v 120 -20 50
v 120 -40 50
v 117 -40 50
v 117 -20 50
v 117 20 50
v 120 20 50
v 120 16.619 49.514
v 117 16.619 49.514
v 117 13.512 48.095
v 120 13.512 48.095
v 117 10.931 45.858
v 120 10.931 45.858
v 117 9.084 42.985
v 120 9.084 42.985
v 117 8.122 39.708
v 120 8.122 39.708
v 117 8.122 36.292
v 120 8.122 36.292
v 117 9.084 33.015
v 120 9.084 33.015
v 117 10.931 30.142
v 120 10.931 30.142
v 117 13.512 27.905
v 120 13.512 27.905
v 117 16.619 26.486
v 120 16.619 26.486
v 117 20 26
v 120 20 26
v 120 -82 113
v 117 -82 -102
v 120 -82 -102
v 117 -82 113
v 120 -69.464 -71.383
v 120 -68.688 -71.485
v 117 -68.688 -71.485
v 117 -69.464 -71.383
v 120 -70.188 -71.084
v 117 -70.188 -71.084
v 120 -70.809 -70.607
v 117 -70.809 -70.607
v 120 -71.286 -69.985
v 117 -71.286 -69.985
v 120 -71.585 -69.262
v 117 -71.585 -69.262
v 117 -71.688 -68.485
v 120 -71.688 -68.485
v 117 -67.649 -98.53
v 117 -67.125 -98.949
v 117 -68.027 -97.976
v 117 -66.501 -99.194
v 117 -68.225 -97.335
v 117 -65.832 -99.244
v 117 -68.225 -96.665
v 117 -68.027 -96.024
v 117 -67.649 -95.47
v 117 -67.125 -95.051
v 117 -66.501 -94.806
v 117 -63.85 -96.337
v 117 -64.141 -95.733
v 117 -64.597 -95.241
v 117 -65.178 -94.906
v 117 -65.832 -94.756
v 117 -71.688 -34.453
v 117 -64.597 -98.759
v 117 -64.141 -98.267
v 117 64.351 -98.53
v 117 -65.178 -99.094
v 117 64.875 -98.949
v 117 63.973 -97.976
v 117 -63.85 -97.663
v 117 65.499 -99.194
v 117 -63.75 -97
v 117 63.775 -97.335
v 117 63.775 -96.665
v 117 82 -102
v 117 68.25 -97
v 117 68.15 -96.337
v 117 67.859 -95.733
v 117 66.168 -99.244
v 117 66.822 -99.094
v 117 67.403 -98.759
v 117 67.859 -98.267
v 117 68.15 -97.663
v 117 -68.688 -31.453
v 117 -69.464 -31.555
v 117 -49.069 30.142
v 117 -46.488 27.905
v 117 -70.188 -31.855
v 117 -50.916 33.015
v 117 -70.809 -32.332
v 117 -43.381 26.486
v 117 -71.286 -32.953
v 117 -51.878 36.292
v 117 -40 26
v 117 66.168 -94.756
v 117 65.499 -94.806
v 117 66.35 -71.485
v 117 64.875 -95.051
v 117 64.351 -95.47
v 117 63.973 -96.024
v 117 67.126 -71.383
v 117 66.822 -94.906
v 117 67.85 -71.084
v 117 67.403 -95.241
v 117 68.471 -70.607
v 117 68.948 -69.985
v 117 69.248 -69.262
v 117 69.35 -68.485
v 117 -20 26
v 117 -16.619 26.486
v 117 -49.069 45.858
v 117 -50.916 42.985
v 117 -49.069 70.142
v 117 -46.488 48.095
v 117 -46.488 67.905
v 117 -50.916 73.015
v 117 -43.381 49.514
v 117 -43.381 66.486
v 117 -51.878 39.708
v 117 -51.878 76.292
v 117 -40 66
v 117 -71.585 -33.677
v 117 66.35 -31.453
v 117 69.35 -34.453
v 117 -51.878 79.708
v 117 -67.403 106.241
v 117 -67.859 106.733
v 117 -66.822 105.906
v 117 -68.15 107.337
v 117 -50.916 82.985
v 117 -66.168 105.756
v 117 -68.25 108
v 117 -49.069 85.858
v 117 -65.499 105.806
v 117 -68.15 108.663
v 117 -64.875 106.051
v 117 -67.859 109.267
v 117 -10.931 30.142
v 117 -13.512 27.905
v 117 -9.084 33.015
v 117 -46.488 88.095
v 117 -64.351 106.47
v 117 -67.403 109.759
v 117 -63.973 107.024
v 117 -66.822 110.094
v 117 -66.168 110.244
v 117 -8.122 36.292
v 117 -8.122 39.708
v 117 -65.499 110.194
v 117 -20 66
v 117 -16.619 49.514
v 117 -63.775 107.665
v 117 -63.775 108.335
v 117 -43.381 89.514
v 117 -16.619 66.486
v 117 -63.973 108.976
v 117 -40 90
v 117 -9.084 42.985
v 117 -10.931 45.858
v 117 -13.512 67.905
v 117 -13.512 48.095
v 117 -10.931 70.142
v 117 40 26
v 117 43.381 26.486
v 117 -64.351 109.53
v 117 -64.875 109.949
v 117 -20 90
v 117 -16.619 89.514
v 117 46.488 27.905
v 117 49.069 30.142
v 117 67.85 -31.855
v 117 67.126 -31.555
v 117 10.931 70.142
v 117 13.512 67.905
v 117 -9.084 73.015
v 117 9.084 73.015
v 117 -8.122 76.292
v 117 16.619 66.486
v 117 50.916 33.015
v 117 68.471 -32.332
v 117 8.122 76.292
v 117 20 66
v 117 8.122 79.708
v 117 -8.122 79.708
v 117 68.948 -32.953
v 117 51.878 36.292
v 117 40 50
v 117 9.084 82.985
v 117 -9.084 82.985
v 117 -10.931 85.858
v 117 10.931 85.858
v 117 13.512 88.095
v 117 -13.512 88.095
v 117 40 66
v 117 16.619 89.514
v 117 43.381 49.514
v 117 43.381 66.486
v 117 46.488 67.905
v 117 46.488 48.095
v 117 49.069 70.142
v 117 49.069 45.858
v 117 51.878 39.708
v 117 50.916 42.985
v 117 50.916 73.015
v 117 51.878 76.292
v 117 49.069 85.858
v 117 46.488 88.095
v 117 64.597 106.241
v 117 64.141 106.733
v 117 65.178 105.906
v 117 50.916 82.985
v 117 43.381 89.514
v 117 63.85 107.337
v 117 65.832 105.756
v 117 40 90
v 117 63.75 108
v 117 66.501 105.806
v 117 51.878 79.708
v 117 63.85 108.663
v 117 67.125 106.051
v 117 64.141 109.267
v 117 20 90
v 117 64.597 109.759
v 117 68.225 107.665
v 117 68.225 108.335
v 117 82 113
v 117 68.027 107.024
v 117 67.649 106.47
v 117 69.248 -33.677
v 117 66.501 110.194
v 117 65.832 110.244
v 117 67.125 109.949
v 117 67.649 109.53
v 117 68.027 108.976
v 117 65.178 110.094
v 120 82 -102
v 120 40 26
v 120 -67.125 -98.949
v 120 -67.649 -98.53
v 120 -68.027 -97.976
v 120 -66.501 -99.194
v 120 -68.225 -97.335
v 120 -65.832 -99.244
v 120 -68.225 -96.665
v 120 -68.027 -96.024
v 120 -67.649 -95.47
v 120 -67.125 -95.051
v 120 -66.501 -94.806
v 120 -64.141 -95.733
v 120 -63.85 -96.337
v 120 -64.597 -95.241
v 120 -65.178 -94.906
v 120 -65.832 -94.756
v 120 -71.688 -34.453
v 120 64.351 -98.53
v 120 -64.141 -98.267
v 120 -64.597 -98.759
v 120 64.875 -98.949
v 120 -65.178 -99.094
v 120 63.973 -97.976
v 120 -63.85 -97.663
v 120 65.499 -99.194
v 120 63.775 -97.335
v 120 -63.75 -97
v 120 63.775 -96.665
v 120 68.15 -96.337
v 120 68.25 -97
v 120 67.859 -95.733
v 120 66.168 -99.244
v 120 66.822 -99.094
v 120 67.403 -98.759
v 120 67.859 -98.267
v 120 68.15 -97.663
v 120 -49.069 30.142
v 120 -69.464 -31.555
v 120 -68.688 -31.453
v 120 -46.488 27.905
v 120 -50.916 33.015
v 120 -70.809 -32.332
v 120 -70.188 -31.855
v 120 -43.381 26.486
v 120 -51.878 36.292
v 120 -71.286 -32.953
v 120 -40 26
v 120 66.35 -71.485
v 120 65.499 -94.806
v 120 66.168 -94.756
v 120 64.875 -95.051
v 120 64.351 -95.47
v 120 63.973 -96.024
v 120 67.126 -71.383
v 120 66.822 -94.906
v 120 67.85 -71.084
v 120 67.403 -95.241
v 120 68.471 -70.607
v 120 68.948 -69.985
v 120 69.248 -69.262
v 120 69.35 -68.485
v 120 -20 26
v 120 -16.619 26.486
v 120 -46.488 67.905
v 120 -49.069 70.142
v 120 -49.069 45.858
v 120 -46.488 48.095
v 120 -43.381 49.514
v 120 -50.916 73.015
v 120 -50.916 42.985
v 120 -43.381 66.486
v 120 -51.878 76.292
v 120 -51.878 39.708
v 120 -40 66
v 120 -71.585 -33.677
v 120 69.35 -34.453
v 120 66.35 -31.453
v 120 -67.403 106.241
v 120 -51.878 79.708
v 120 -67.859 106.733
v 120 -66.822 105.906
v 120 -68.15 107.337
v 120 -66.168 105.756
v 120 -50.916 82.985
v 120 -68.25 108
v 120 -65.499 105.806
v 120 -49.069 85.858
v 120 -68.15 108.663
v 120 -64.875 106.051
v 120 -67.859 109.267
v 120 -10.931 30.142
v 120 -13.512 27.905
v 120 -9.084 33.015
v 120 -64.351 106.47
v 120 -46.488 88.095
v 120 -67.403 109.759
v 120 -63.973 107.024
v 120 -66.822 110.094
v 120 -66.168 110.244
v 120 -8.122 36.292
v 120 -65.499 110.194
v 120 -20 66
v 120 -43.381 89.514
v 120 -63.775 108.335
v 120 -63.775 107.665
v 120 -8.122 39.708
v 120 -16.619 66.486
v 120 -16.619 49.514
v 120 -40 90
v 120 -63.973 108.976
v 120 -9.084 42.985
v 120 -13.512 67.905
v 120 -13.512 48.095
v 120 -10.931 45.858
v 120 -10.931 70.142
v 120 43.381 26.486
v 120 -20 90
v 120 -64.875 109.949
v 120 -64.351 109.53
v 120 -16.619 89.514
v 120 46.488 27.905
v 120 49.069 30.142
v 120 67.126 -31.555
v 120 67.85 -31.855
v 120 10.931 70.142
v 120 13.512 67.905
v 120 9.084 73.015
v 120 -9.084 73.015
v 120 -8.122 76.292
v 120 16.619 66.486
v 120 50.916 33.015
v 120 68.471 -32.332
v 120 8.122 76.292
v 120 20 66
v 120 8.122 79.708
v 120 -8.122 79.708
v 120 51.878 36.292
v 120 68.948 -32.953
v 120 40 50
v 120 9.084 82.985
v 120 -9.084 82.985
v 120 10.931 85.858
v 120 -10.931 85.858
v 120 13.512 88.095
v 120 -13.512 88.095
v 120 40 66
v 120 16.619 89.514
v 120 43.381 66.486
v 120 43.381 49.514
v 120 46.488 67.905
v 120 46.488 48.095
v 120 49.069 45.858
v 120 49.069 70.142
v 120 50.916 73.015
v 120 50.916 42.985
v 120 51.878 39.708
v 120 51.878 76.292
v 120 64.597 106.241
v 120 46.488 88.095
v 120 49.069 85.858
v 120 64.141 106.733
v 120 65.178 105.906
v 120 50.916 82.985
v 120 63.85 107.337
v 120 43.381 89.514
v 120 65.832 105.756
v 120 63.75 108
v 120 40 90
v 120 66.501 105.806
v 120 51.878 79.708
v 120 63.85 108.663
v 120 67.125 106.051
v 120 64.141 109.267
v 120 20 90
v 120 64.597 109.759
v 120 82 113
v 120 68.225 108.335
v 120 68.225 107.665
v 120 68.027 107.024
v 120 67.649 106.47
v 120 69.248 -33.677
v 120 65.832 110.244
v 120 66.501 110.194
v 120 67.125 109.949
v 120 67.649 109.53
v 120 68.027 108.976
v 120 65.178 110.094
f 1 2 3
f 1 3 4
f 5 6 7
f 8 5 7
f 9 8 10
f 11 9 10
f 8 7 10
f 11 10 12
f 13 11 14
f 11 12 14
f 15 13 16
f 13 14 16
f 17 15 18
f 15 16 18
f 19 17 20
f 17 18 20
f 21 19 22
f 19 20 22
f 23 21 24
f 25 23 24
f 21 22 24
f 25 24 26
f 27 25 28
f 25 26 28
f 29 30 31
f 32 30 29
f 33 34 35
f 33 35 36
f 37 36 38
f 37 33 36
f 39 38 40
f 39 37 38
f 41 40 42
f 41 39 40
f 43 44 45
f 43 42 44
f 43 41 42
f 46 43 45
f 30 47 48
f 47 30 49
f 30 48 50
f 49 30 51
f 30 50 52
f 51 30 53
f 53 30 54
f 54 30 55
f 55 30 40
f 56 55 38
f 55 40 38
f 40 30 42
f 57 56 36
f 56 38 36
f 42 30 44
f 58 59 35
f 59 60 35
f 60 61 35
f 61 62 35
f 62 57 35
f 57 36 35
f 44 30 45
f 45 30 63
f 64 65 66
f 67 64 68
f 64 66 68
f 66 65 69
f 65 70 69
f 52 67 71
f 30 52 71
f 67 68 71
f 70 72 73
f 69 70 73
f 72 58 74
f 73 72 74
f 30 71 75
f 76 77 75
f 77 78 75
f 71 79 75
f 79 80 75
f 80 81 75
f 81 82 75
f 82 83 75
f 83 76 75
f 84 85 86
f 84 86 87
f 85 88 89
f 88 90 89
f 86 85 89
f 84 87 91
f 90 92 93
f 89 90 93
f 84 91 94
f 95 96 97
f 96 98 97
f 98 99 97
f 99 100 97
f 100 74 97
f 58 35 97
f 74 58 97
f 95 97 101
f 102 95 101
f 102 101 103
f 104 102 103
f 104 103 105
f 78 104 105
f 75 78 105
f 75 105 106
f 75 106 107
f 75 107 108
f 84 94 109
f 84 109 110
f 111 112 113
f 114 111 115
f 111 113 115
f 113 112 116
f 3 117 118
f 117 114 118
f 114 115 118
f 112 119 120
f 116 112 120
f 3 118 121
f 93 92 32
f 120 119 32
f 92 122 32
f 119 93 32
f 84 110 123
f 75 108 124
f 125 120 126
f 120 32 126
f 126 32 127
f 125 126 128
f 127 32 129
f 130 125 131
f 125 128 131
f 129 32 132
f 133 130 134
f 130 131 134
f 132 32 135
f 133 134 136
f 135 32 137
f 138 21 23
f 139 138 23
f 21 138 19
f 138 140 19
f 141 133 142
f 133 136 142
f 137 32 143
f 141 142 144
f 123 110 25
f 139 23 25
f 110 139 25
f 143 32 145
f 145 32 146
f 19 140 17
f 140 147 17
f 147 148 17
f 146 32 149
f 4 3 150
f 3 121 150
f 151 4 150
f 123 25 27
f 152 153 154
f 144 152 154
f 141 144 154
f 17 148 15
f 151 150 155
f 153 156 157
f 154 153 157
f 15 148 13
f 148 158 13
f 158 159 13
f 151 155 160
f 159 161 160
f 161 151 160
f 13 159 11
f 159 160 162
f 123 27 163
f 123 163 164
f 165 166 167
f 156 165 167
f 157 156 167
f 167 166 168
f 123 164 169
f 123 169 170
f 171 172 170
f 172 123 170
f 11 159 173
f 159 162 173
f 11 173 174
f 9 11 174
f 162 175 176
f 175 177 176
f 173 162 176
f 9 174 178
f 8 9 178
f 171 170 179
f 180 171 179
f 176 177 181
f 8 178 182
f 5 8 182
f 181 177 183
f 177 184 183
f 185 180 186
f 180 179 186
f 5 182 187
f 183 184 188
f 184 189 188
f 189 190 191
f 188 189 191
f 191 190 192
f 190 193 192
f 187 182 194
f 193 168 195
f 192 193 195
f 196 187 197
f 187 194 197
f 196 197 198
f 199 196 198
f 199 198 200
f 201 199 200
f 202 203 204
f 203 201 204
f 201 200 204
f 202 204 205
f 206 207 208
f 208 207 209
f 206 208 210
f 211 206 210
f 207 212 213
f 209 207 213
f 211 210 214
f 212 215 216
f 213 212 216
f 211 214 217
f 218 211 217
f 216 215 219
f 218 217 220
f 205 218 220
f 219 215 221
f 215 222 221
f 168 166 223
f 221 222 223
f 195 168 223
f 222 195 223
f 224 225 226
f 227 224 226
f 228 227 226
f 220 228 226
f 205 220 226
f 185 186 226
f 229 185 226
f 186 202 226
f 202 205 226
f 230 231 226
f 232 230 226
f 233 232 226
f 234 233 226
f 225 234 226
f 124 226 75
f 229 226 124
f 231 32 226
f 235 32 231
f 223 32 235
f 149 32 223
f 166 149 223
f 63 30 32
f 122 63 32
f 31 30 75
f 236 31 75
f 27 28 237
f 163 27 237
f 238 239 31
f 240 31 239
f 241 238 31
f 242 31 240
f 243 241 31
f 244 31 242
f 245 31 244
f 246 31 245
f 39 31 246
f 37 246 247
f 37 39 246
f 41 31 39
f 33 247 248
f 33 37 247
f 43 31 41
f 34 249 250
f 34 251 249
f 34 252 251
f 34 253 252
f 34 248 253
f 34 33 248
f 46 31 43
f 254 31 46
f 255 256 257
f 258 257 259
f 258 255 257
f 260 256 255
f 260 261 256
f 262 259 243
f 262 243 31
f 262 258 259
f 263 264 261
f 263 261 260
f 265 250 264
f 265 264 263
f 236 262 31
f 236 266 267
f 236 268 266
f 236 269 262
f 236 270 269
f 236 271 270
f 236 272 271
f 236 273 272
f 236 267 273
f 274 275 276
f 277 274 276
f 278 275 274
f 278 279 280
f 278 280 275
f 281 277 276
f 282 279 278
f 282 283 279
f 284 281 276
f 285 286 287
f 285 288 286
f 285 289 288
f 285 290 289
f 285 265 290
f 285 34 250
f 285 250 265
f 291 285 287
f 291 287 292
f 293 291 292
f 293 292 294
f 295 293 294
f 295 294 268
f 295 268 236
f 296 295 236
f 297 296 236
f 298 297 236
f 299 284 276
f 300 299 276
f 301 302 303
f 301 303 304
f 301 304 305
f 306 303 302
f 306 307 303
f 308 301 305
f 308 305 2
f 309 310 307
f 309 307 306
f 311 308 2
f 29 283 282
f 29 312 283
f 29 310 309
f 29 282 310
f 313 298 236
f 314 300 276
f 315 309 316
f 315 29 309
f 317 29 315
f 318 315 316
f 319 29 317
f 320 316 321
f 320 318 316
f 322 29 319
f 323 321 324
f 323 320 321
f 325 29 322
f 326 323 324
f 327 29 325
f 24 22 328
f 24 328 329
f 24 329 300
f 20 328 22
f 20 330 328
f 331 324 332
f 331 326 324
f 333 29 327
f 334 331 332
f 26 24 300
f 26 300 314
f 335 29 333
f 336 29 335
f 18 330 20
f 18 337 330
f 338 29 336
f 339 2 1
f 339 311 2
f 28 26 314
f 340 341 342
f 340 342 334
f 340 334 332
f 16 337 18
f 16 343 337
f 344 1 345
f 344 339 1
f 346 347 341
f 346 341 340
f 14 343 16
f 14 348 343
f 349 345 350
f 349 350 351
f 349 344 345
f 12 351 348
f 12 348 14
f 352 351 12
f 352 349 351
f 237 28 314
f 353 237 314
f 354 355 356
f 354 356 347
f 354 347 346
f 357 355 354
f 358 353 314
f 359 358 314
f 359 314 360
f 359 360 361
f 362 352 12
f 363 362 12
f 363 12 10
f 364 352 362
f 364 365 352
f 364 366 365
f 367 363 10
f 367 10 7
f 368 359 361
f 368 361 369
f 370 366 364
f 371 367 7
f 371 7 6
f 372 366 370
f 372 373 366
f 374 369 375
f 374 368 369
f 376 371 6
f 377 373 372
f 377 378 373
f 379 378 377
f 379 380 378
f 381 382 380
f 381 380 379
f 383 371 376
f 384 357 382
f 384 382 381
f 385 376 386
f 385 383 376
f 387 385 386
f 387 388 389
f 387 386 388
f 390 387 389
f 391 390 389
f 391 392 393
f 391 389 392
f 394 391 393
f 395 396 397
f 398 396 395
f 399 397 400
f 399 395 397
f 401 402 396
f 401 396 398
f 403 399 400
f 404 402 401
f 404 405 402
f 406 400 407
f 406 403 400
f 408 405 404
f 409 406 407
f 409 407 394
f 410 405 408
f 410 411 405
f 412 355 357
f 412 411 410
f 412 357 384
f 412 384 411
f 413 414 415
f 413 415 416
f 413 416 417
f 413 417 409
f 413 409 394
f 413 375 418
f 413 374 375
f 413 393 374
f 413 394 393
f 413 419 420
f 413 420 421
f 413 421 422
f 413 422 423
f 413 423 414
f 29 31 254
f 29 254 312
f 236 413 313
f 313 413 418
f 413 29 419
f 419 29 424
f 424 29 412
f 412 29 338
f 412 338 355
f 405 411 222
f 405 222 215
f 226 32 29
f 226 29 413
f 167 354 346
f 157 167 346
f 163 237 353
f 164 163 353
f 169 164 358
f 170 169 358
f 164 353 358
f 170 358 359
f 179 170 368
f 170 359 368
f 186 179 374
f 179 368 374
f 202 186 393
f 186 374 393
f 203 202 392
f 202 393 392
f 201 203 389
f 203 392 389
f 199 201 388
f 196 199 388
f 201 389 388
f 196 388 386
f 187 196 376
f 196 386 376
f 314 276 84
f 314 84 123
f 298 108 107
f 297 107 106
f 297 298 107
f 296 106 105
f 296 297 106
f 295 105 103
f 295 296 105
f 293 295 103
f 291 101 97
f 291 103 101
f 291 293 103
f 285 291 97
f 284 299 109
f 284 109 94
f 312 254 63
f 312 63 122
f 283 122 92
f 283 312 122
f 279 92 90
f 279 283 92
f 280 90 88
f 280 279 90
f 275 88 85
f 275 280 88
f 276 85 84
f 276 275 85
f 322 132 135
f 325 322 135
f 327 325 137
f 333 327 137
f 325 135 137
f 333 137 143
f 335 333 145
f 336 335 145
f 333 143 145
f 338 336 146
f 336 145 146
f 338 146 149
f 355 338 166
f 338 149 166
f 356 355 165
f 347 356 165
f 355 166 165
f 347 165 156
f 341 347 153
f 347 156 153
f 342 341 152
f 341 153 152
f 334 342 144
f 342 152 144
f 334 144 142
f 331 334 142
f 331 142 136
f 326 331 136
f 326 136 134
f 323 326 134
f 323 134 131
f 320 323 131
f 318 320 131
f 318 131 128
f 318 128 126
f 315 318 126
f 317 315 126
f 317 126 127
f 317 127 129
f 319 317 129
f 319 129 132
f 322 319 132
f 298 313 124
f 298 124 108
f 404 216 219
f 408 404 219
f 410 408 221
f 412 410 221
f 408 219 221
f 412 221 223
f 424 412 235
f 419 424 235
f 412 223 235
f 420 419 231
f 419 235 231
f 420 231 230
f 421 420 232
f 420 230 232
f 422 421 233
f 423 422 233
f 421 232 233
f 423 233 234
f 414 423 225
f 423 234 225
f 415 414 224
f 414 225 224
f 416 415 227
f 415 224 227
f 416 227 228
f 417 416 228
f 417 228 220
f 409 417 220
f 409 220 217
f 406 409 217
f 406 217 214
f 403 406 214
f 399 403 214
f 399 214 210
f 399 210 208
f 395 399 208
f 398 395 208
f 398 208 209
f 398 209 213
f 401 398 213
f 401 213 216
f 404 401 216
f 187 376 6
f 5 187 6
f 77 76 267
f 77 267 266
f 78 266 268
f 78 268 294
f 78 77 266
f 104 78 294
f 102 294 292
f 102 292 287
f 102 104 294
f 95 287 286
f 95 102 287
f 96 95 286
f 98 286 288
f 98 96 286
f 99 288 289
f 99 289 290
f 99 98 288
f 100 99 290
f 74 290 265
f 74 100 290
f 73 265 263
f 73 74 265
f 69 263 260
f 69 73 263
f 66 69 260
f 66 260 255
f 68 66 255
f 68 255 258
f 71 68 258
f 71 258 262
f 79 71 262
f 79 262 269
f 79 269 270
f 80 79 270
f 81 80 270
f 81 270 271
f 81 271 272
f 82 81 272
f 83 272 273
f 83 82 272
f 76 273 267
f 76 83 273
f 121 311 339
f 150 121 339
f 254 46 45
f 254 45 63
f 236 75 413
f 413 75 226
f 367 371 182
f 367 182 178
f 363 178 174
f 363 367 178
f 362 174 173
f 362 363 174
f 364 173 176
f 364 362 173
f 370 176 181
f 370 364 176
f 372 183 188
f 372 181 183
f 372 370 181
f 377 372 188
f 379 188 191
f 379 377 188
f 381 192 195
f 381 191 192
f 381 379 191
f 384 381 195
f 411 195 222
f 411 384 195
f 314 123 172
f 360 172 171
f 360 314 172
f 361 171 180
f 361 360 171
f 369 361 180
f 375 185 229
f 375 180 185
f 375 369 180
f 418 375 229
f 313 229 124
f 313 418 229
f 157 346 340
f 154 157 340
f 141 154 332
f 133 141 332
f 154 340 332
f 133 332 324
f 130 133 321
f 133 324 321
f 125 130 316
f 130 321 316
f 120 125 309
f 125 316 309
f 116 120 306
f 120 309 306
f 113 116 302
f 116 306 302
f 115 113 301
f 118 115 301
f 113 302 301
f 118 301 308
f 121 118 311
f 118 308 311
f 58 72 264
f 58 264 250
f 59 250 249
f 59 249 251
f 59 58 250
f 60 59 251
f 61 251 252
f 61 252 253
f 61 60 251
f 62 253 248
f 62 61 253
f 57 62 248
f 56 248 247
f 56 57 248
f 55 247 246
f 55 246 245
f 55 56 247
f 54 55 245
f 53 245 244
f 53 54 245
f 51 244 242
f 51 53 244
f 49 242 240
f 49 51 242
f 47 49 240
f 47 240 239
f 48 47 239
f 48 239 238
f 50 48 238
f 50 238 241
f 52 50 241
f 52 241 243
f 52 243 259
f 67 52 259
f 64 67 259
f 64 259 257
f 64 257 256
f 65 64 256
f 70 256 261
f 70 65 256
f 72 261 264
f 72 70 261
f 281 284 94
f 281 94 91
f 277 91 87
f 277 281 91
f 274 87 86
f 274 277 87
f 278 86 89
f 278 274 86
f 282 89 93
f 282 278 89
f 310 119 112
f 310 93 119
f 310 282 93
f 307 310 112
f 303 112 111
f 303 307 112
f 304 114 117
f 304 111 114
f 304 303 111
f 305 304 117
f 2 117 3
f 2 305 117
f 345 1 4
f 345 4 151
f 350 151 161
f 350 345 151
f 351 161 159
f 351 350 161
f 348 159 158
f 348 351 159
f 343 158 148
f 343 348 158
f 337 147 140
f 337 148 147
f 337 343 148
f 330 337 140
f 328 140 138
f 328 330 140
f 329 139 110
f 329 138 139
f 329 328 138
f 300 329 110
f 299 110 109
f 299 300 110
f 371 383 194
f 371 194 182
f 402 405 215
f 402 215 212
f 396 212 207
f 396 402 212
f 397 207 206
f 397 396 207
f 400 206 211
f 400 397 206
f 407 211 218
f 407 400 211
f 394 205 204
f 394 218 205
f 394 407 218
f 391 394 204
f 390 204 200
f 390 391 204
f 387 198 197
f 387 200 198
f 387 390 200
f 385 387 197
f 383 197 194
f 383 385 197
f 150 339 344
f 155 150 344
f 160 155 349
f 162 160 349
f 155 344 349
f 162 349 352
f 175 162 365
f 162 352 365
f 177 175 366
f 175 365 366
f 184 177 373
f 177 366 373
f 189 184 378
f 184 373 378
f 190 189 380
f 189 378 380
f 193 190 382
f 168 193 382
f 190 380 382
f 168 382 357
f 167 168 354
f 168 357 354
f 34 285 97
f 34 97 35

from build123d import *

# Parameters (mm, degrees)
SKETCH_1_W                         = 240
SKETCH_1_H                         = 170
EXTRUDE_1_DEPTH                    = 3
EXTRUDE_2_DEPTH                    = 10
EXTRUDE_3_DEPTH                    = 10
SKETCH_4_R                         = 3
CUT_EXTRUDE_1_DEPTH                = 6
SKETCH_5_R                         = 2.1
CUT_EXTRUDE_2_DEPTH                = 253.117036314
SKETCH_7_R                         = 1.6
SKETCH_7_W                         = 103
SKETCH_7_H                         = 20
EXTRUDE_4_DEPTH                    = 3
SKETCH_8_W                         = 110
SKETCH_8_H                         = 164
SKETCH_8_R                         = 2.1
EXTRUDE_5_DEPTH                    = 3
SKETCH_9_W                         = 240
SKETCH_9_H                         = 110
EXTRUDE_6_DEPTH                    = 3
SKETCH_10_R                        = 1.6
EXTRUDE_7_DEPTH                    = 2
SKETCH_11_W                        = 10
SKETCH_11_H                        = 20.7
SKETCH_11_R                        = 3
EXTRUDE_8_DEPTH                    = 6
CUT_EXTRUDE_3_DEPTH                = 237.788935552
SKETCH_14_R                        = 5
SKETCH_14_R_2                      = 2.25
EXTRUDE_9_DEPTH                    = 5
SKETCH_16_W                        = 20
SKETCH_16_H                        = 150
EXTRUDE_13_DEPTH                   = 3
CUT_EXTRUDE_5_DEPTH                = 282.346761133
EXTRUDE_START                      = 100
EXTRUDE_14_DEPTH                   = 10
SKETCH_21_R                        = 1.65
CUT_EXTRUDE_6_DEPTH                = 242.828451593
SKETCH_22_R                        = 3
CUT_EXTRUDE_7_DEPTH                = 240.666434863
FILLET_1_R                         = 3
FILLET_2_R                         = 3
SKETCH_4_5_R                       = 2.25
F_4_5_3MM_DEPTH                    = 3.01
SKETCH_Y_6_R                       = 3
CUT_EXTRUDE_Y_6_DEPTH              = 6.01
SKETCH_Y_3_2_R                     = 1.6
CUT_EXTRUDE_Y_3_2_DEPTH            = 3.01
A_M4_2_R                           = 2.25
A_M4_DEPTH                         = 9.01
B_M4_2_R                           = 2.25
B_M4_DEPTH                         = 9.01
MOVE_FACE_M4_4_2_4_5_BY            = 0.15
MOVE_FACE_M4_4_2_4_5_2_BY          = 0.15
MOVE_FACE_M4_4_2_4_5_3_BY          = 0.15
MOVE_FACE_M4_4_2_4_5_4_BY          = 0.15
MOVE_FACE_M4_4_2_4_5_5_BY          = 0.15
MOVE_FACE_M4_4_2_4_5_6_BY          = 0.15
MOVE_FACE_M4_4_2_4_5_7_BY          = 0.15
MOVE_FACE_M4_4_2_4_5_8_BY          = 0.15
MOVE_FACE_M4_6_4_5_BY              = 0.75
MOVE_FACE_M4_6_4_5_2_BY            = 0.75
MOVE_FACE_M4_6_4_5_3_BY            = 0.75
MOVE_FACE_M4_6_4_5_4_BY            = 0.75
MOVE_START                         = -85
MOVE_FACE_M4_3_2_4_5_OUTLINE_R     = 2.25
MOVE_FACE_M4_3_2_4_5_OUTLINE_R_2   = 1.6
MOVE_FACE_M4_3_2_4_5_DEPTH         = 3
MOVE_START_2                       = 82
MOVE_FACE_M4_3_2_4_5_2_OUTLINE_R   = 2.25
MOVE_FACE_M4_3_2_4_5_2_OUTLINE_R_2 = 1.6
MOVE_FACE_M4_3_2_4_5_2_DEPTH       = 3
MOVE_START_3                       = 47
MOVE_FACE_6_M3_3_3_OUTLINE_R       = 3
MOVE_FACE_6_M3_3_3_OUTLINE_R_2     = 1.65
MOVE_FACE_6_M3_3_3_DEPTH           = 6
MOVE_FACE_6_M3_3_3_2_OUTLINE_R     = 3
MOVE_FACE_6_M3_3_3_2_OUTLINE_R_2   = 1.65
MOVE_FACE_6_M3_3_3_2_DEPTH         = 6
MOVE_START_4                       = -82
MOVE_FACE_6_M3_3_3_3_OUTLINE_R     = 3
MOVE_FACE_6_M3_3_3_3_OUTLINE_R_2   = 1.65
MOVE_FACE_6_M3_3_3_3_DEPTH         = 6
MOVE_START_5                       = 76
MOVE_FACE_6_M3_3_3_4_OUTLINE_R     = 3
MOVE_FACE_6_M3_3_3_4_OUTLINE_R_2   = 1.65
MOVE_FACE_6_M3_3_3_4_DEPTH         = 6
Y_M3_5_9_1_5_DEPTH                 = 1.5
Y_M3_5_9_1_5_3_DEPTH               = 1.5
V3_03_A_105_START                  = 117
V3_03_A_105_OUTLINE_W              = 164
V3_03_A_105_OUTLINE_H              = 105
V3_03_A_105_OUTLINE_R              = 2.25
V3_03_A_105_DEPTH                  = 3
V3_04_B_105_START                  = -120
V3_04_B_105_OUTLINE_W              = 164
V3_04_B_105_OUTLINE_H              = 105
V3_04_B_105_OUTLINE_R              = 2.25
V3_04_B_105_DEPTH                  = 3
V3_06_B_105_START                  = 82
V3_06_B_105_OUTLINE_W              = 240
V3_06_B_105_OUTLINE_H              = 105
V3_06_B_105_OUTLINE_R              = 2.25
V3_06_B_105_DEPTH                  = 3
V3_05_A_105_START                  = -85
V3_05_A_105_OUTLINE_R              = 2.25
V3_05_A_105_DEPTH                  = 3
V3_77X53_2_W                       = 77
V3_77X53_2_H                       = 53
V3_77X53_DEPTH                     = 3.01
CUT_EXTRUDE_8_DEPTH                = 140.649561403


# Read off the part's stored shape, not the designer's step: the move face step, the move face step, the move face step, the move face step, the move face step, the move face step
with BuildPart() as part:
    # Sketch 1 → Extrude 1 (new body)
    with BuildSketch(Plane.XY):
        Rectangle(SKETCH_1_W, SKETCH_1_H)
    extrude(amount=EXTRUDE_1_DEPTH)

    # Sketch 2 → Extrude 2 (add)
    with BuildSketch(Plane.XY.offset(3)):
        Polygon((117, -82), (117, -61), (111, -61), (111, -76), (96, -76), (96, -82), align=None)
        Polygon((96, 82), (117, 82), (117, 61), (111, 61), (111, 76), (96, 76), align=None)
        Polygon((-96, -82), (-117, -82), (-117, -61), (-111, -61), (-111, -76), (-96, -76), align=None)
        Polygon((-117, 82), (-117, 61), (-111, 61), (-111, 76), (-96, 76), (-96, 82), align=None)
    extrude(amount=EXTRUDE_2_DEPTH)

    # Sketch 3 → Extrude 3 (add)
    with BuildSketch(Plane.XY.offset(3)):
        Polygon((-22, 35), (-7, 35), (-7, 41), (-28, 41), (-43, 41), (-43, 35), (-28, 35), (-28, 20), (-22, 20), align=None)
        Polygon((117, 20), (111, 20), (111, 35), (96, 35), (96, 41), (117, 41), align=None)
        Polygon((-28, -35), (-28, -20), (-22, -20), (-22, -41), (-43, -41), (-43, -35), align=None)
        Polygon((-83, -41), (-83, -35), (-98, -35), (-98, -20), (-104, -20), (-104, -41), align=None)
        Polygon((-104, 20), (-104, 35), (-104, 41), (-98, 41), (-83, 41), (-83, 35), (-98, 35), (-98, 20), align=None)
    extrude(amount=EXTRUDE_3_DEPTH)

    # Sketch 4 → Cut-Extrude 1 (cut)
    with BuildSketch(Plane.XZ.offset(82)):
        with Locations((101, 8)):
            Circle(SKETCH_4_R)
        with Locations((-101, 8)):
            Circle(SKETCH_4_R)
    extrude(amount=-CUT_EXTRUDE_1_DEPTH, mode=Mode.SUBTRACT)

    # Sketch 5 → Cut-Extrude 2 (cut, through all)
    with BuildSketch(Plane.ZY.offset(117)):
        with Locations(Location((8, -66, 0), (0, 0, 270))):
            Circle(SKETCH_5_R)
        with Locations(Location((8, 66, 0), (0, 0, 270))):
            Circle(SKETCH_5_R)
    extrude(amount=-CUT_EXTRUDE_2_DEPTH, mode=Mode.SUBTRACT)

    # Sketch Y___6 → Cut-Extrude Y___6 (cut)
    with BuildSketch(Plane.XZ.offset(-76)):
        with Locations((-101, 8)):
            Circle(SKETCH_Y_6_R)
        with Locations((101, 8)):
            Circle(SKETCH_Y_6_R)
    extrude(amount=-CUT_EXTRUDE_Y_6_DEPTH, mode=Mode.SUBTRACT)

    # Move Face M4__4.2_4.5 3: a curved face moved inward by 0.15
    add(Solid.thicken(part.faces().sort_by_distance((-114, -63.9, 8))[0], -MOVE_FACE_M4_4_2_4_5_3_BY), mode=Mode.SUBTRACT)

    # Move Face M4__4.2_4.5 4: a curved face moved inward by 0.15
    add(Solid.thicken(part.faces().sort_by_distance((-114, 68.1, 8))[0], -MOVE_FACE_M4_4_2_4_5_4_BY), mode=Mode.SUBTRACT)

    # Move Face M4__4.2_4.5 5: a curved face moved inward by 0.15
    add(Solid.thicken(part.faces().sort_by_distance((114, 68.1, 8))[0], -MOVE_FACE_M4_4_2_4_5_5_BY), mode=Mode.SUBTRACT)

    # Move Face M4__4.2_4.5 6: a curved face moved inward by 0.15
    add(Solid.thicken(part.faces().sort_by_distance((114, -63.9, 8))[0], -MOVE_FACE_M4_4_2_4_5_6_BY), mode=Mode.SUBTRACT)

    # Move Face M4__6_4.5: a curved face moved outward by 0.75
    add(Solid.thicken(part.faces().sort_by_distance((-104, -79, 8))[0], MOVE_FACE_M4_6_4_5_BY))

    # Move Face M4__6_4.5 2: a curved face moved outward by 0.75
    add(Solid.thicken(part.faces().sort_by_distance((98, -79, 8))[0], MOVE_FACE_M4_6_4_5_2_BY))

    # Move Face M4__6_4.5 3: a curved face moved outward by 0.75
    add(Solid.thicken(part.faces().sort_by_distance((-104, 79, 8))[0], MOVE_FACE_M4_6_4_5_3_BY))

    # Move Face M4__6_4.5 4: a curved face moved outward by 0.75
    add(Solid.thicken(part.faces().sort_by_distance((98, 79, 8))[0], MOVE_FACE_M4_6_4_5_4_BY))


with BuildPart() as body_2:
    # Sketch 7 → Extrude 4 (new body)
    with BuildSketch(Plane.XZ.offset(85)):
        Polygon((-120, 3), (-83, 3), (-83, 13), (-43, 13), (-43, 3), (120, 3), (120, 113), (-120, 113), align=None)
        with Locations(Location((101, 8, 0), (0, 0, 270))):
            Circle(SKETCH_7_R, mode=Mode.SUBTRACT)
        with Locations(Location((-101, 8, 0), (0, 0, 270))):
            Circle(SKETCH_7_R, mode=Mode.SUBTRACT)
        with Locations((44.5, 23)):
            Rectangle(SKETCH_7_W, SKETCH_7_H, mode=Mode.SUBTRACT)
    extrude(amount=-EXTRUDE_4_DEPTH)


with BuildPart() as body_3:
    # Sketch 8 → Extrude 5 (new body)
    with BuildSketch(Plane(origin=(117, 0, 0), x_dir=(0, 0, -1), z_dir=(1, 0, 0))):
        with Locations((-58, 0)):
            Rectangle(SKETCH_8_W, SKETCH_8_H)
        with Locations(Location((-8, -66, 0), (0, 0, 90))):
            Circle(SKETCH_8_R, mode=Mode.SUBTRACT)
        with Locations(Location((-8, 66, 0), (0, 0, 90))):
            Circle(SKETCH_8_R, mode=Mode.SUBTRACT)
    extrude(amount=EXTRUDE_5_DEPTH)


with BuildPart() as body_4:
    # Mirror 1: mirrored copy
    add(body_3.part.mirror(Plane(origin=(0, 0, 0), x_dir=(0, 0, 1), z_dir=(1, 0, 0))))


with BuildPart() as body_5:
    # Sketch 9 → Extrude 6 (new body)
    with BuildSketch(Plane(origin=(0, 82, 0), x_dir=(1, 0, 0), z_dir=(0, 1, 0))):
        with Locations((0, -58)):
            Rectangle(SKETCH_9_W, SKETCH_9_H)
    extrude(amount=EXTRUDE_6_DEPTH)


    add(body_2.part)  # Extrude 8 merges body 2
    # Sketch 11 → Extrude 8 (add)
    # profile 1 of 4: a face of its own
    with BuildSketch(Plane(origin=(0, 0, 53), x_dir=(-1, 0, 0), z_dir=(0, 0, -1))):
        with Locations((-112, 71.65)):
            Rectangle(SKETCH_11_W, SKETCH_11_H)
        with Locations((-112, 66.3)):
            Circle(SKETCH_11_R, mode=Mode.SUBTRACT)
    # profile 2 of 4: a face of its own
    with BuildSketch(Plane(origin=(0, 0, 53), x_dir=(-1, 0, 0), z_dir=(0, 0, -1))):
        with Locations((-112, -71.65)):
            Rectangle(SKETCH_11_W, SKETCH_11_H)
        with Locations((-112, -66.3)):
            Circle(SKETCH_11_R, mode=Mode.SUBTRACT)
    # profile 3 of 4: a face of its own
    with BuildSketch(Plane(origin=(0, 0, 53), x_dir=(-1, 0, 0), z_dir=(0, 0, -1))):
        with Locations((-26, -71.65)):
            Rectangle(SKETCH_11_W, SKETCH_11_H)
        with Locations((-26, -66.3)):
            Circle(SKETCH_11_R, mode=Mode.SUBTRACT)
    # profile 4 of 4: a face of its own
    with BuildSketch(Plane(origin=(0, 0, 53), x_dir=(-1, 0, 0), z_dir=(0, 0, -1))):
        with Locations((-26, 71.65)):
            Rectangle(SKETCH_11_W, SKETCH_11_H)
        with Locations((-26, 66.3)):
            Circle(SKETCH_11_R, mode=Mode.SUBTRACT)
    extrude(amount=EXTRUDE_8_DEPTH)

    # Sketch 12 → Cut-Extrude 3 (cut, through all)
    with BuildSketch(Plane.XZ.offset(85)):
        with BuildLine():
            Line((109, 56), (5, 56))
            ThreePointArc((5, 56), (2.878679656, 56.878679656), (2, 59))
            Line((2, 59), (2, 73))
            ThreePointArc((2, 73), (2.878679656, 75.121320344), (5, 76))
            Line((5, 76), (109, 76))
            ThreePointArc((109, 76), (111.121320344, 75.121320344), (112, 73))
            Line((112, 73), (112, 59))
            ThreePointArc((112, 59), (111.121320344, 56.878679656), (109, 56))
        make_face()
    extrude(amount=-CUT_EXTRUDE_3_DEPTH, mode=Mode.SUBTRACT)

    # Sketch 14 → Extrude 9 (add)
    # profile 1 of 4: a face of its own
    with BuildSketch(Plane(origin=(0, 85, 0), x_dir=(1, 0, 0), z_dir=(0, 1, 0))):
        with Locations(Location((-109.209330844, -20.536345828, 0), (0, 0, 180))):
            Circle(SKETCH_14_R)
        with Locations(Location((-109.209330844, -20.536345828, 0), (0, 0, 180))):
            Circle(SKETCH_14_R_2, mode=Mode.SUBTRACT)
    # profile 2 of 4: a face of its own
    with BuildSketch(Plane(origin=(0, 85, 0), x_dir=(1, 0, 0), z_dir=(0, 1, 0))):
        with Locations(Location((-34.159330844, -20.536345828, 0), (0, 0, 180))):
            Circle(SKETCH_14_R)
        with Locations(Location((-34.159330844, -20.536345828, 0), (0, 0, 180))):
            Circle(SKETCH_14_R_2, mode=Mode.SUBTRACT)
    # profile 3 of 4: a face of its own
    with BuildSketch(Plane(origin=(0, 85, 0), x_dir=(1, 0, 0), z_dir=(0, 1, 0))):
        with Locations(Location((-34.159330844, -95.586345828, 0), (0, 0, 180))):
            Circle(SKETCH_14_R)
        with Locations(Location((-34.159330844, -95.586345828, 0), (0, 0, 180))):
            Circle(SKETCH_14_R_2, mode=Mode.SUBTRACT)
    # profile 4 of 4: a face of its own
    with BuildSketch(Plane(origin=(0, 85, 0), x_dir=(1, 0, 0), z_dir=(0, 1, 0))):
        with Locations(Location((-109.209330844, -95.586345828, 0), (0, 0, 180))):
            Circle(SKETCH_14_R)
        with Locations(Location((-109.209330844, -95.586345828, 0), (0, 0, 180))):
            Circle(SKETCH_14_R_2, mode=Mode.SUBTRACT)
    extrude(amount=EXTRUDE_9_DEPTH)


with BuildPart() as body_6:
    # Sketch 10 → Extrude 7 (new body)
    with BuildSketch(Plane.XY.offset(53)):
        Polygon((117, 82), (105.994732546, 82), (105.994732546, 66.3), (31.393483554, 66.3), (31.393483554, 82), (21, 82), (21, -82), (117, -82), align=None)
        with Locations((26, 66.3)):
            Circle(SKETCH_10_R, mode=Mode.SUBTRACT)
        with Locations((112, 66.3)):
            Circle(SKETCH_10_R, mode=Mode.SUBTRACT)
        with Locations((112, -66.3)):
            Circle(SKETCH_10_R, mode=Mode.SUBTRACT)
        with Locations((26, -66.3)):
            Circle(SKETCH_10_R, mode=Mode.SUBTRACT)
    extrude(amount=EXTRUDE_7_DEPTH)


with BuildPart() as body_6_2:
    # Sketch 16 → Extrude 13 (new body)
    with BuildSketch(Plane.XY.offset(113)):
        Polygon((-120, 85), (120, 85), (120, -85), (-120, -85), (-120, -15), (-112, -15), (-112, 15), (-120, 15), align=None)
        with Locations((21, 0)):
            Rectangle(SKETCH_16_W, SKETCH_16_H, mode=Mode.SUBTRACT)
    extrude(amount=EXTRUDE_13_DEPTH)

    # Sketch 20 → Extrude 14 (add)
    with BuildSketch(Plane.XY.offset(13).offset(EXTRUDE_START)):
        Polygon((111, 61), (111, 76), (96, 76), (96, 82), (117, 82), (117, 61), align=None)
        Polygon((-96, 82), (-117, 82), (-117, 61), (-111, 61), (-111, 76), (-96, 76), align=None)
        Polygon((-117, -61), (-117, -82), (-96, -82), (-96, -76), (-111, -76), (-111, -61), align=None)
        Polygon((111, -76), (96, -76), (96, -82), (117, -82), (117, -61), (111, -61), align=None)
    extrude(amount=-EXTRUDE_14_DEPTH)


with BuildPart() as cut_extrude_5_tool:
    # Sketch 18 → Cut-Extrude 5 (new, through all)
    with BuildSketch(Plane(origin=(120, 0, 0), x_dir=(0, 0, -1), z_dir=(1, 0, 0))):
        with BuildLine():
            Line((-66, 40), (-66, 20))
            ThreePointArc((-66, 20), (-78, 8), (-90, 20))
            Line((-90, 20), (-90, 40))
            ThreePointArc((-90, 40), (-78, 52), (-66, 40))
        make_face()
        with BuildLine():
            Line((-66, -40), (-66, -20))
            ThreePointArc((-66, -20), (-78, -8), (-90, -20))
            Line((-90, -20), (-90, -40))
            ThreePointArc((-90, -40), (-78, -52), (-66, -40))
        make_face()
        with BuildLine():
            Line((-50, -40), (-50, -20))
            ThreePointArc((-50, -20), (-38, -8), (-26, -20))
            Line((-26, -20), (-26, -40))
            ThreePointArc((-26, -40), (-38, -52), (-50, -40))
        make_face()
        with BuildLine():
            Line((-50, 40), (-50, 20))
            ThreePointArc((-50, 20), (-38, 8), (-26, 20))
            Line((-26, 20), (-26, 40))
            ThreePointArc((-26, 40), (-38, 52), (-50, 40))
        make_face()
    extrude(amount=-CUT_EXTRUDE_5_DEPTH)


with BuildPart() as body_3_1:
    add(body_3.part)

    # Cut-Extrude 5: cut by cut_extrude_5_tool
    add(cut_extrude_5_tool.part, mode=Mode.SUBTRACT)


with BuildPart() as body_4_1:
    add(body_4.part)

    # Cut-Extrude 5: cut by cut_extrude_5_tool
    add(cut_extrude_5_tool.part, mode=Mode.SUBTRACT)


with BuildPart() as cut_extrude_6_tool:
    # Sketch 21 → Cut-Extrude 6 (new, through all)
    with BuildSketch(Plane.XZ.offset(85)):
        with Locations(Location((101, 108, 0), (0, 0, 180))):
            Circle(SKETCH_21_R)
        with Locations(Location((-101, 108, 0), (0, 0, 180))):
            Circle(SKETCH_21_R)
    extrude(amount=-CUT_EXTRUDE_6_DEPTH)


with BuildPart() as body_5_1:
    add(body_5.part)

    # Cut-Extrude 6: cut by cut_extrude_6_tool
    add(cut_extrude_6_tool.part, mode=Mode.SUBTRACT)

    # Fillet 1
    fillet_1_edges = [body_5_1.edges().sort_by_distance(p)[0] for p in [
        (-43, -83.5, 13),
        (-83, -83.5, 13),
        (96, -83.5, 13),
        (-7, -83.5, 13),
        (-7, -83.5, 33),
        (96, -83.5, 33),
    ]]
    fillet(fillet_1_edges, radius=FILLET_1_R)

    # Sketch 4.5 → 4.5___3mm (cut)
    with BuildSketch(Plane.XZ.offset(-82)):
        with Locations((-109.209330844, 20.536345828)):
            Circle(SKETCH_4_5_R)
        with Locations((-34.159330844, 20.536345828)):
            Circle(SKETCH_4_5_R)
        with Locations((-34.159330844, 95.586345828)):
            Circle(SKETCH_4_5_R)
        with Locations((-109.209330844, 95.586345828)):
            Circle(SKETCH_4_5_R)
    extrude(amount=-F_4_5_3MM_DEPTH, mode=Mode.SUBTRACT)

    # Sketch Y___3.2 → Cut-Extrude Y___3.2 (cut)
    with BuildSketch(Plane.XZ.offset(-82)):
        with Locations((-101, 8)):
            Circle(SKETCH_Y_3_2_R)
        with Locations((101, 8)):
            Circle(SKETCH_Y_3_2_R)
    extrude(amount=-CUT_EXTRUDE_Y_3_2_DEPTH, mode=Mode.SUBTRACT)

    # Move Face M4__3.2_4.5 outline → Move Face M4__3.2_4.5 (cut)
    # profile 1 of 2: a face of its own
    with BuildSketch(Plane(origin=(0, 0, 0), x_dir=(1, 0, 0), z_dir=(0, 1, 0)).offset(MOVE_START)):
        with Locations((101, -8)):
            Circle(MOVE_FACE_M4_3_2_4_5_OUTLINE_R)
        with Locations((101, -8)):
            Circle(MOVE_FACE_M4_3_2_4_5_OUTLINE_R_2, mode=Mode.SUBTRACT)
    # profile 2 of 2: a face of its own
    with BuildSketch(Plane(origin=(0, 0, 0), x_dir=(1, 0, 0), z_dir=(0, 1, 0)).offset(MOVE_START)):
        with Locations((-101, -8)):
            Circle(MOVE_FACE_M4_3_2_4_5_OUTLINE_R)
        with Locations((-101, -8)):
            Circle(MOVE_FACE_M4_3_2_4_5_OUTLINE_R_2, mode=Mode.SUBTRACT)
    extrude(amount=MOVE_FACE_M4_3_2_4_5_DEPTH, mode=Mode.SUBTRACT)

    # Move Face M4__3.2_4.5 2 outline → Move Face M4__3.2_4.5 2 (cut)
    # profile 1 of 2: a face of its own
    with BuildSketch(Plane(origin=(0, 0, 0), x_dir=(1, 0, 0), z_dir=(0, 1, 0)).offset(MOVE_START_2)):
        with Locations((101, -8)):
            Circle(MOVE_FACE_M4_3_2_4_5_2_OUTLINE_R)
        with Locations((101, -8)):
            Circle(MOVE_FACE_M4_3_2_4_5_2_OUTLINE_R_2, mode=Mode.SUBTRACT)
    # profile 2 of 2: a face of its own
    with BuildSketch(Plane(origin=(0, 0, 0), x_dir=(1, 0, 0), z_dir=(0, 1, 0)).offset(MOVE_START_2)):
        with Locations((-101, -8)):
            Circle(MOVE_FACE_M4_3_2_4_5_2_OUTLINE_R)
        with Locations((-101, -8)):
            Circle(MOVE_FACE_M4_3_2_4_5_2_OUTLINE_R_2, mode=Mode.SUBTRACT)
    extrude(amount=MOVE_FACE_M4_3_2_4_5_2_DEPTH, mode=Mode.SUBTRACT)

    # Move Face 6_M3_3.3 outline → Move Face 6_M3_3.3 (add)
    # profile 1 of 2: a face of its own
    with BuildSketch(Plane.XY.offset(MOVE_START_3)):
        with Locations((112, 66.3)):
            Circle(MOVE_FACE_6_M3_3_3_OUTLINE_R)
        with Locations((112, 66.3)):
            Circle(MOVE_FACE_6_M3_3_3_OUTLINE_R_2, mode=Mode.SUBTRACT)
    # profile 2 of 2: a face of its own
    with BuildSketch(Plane.XY.offset(MOVE_START_3)):
        with Locations((26, 66.3)):
            Circle(MOVE_FACE_6_M3_3_3_OUTLINE_R)
        with Locations((26, 66.3)):
            Circle(MOVE_FACE_6_M3_3_3_OUTLINE_R_2, mode=Mode.SUBTRACT)
    extrude(amount=MOVE_FACE_6_M3_3_3_DEPTH)

    # Move Face 6_M3_3.3 2 outline → Move Face 6_M3_3.3 2 (add)
    # profile 1 of 2: a face of its own
    with BuildSketch(Plane.XY.offset(MOVE_START_3)):
        with Locations((112, -66.3)):
            Circle(MOVE_FACE_6_M3_3_3_2_OUTLINE_R)
        with Locations((112, -66.3)):
            Circle(MOVE_FACE_6_M3_3_3_2_OUTLINE_R_2, mode=Mode.SUBTRACT)
    # profile 2 of 2: a face of its own
    with BuildSketch(Plane.XY.offset(MOVE_START_3)):
        with Locations((26, -66.3)):
            Circle(MOVE_FACE_6_M3_3_3_2_OUTLINE_R)
        with Locations((26, -66.3)):
            Circle(MOVE_FACE_6_M3_3_3_2_OUTLINE_R_2, mode=Mode.SUBTRACT)
    extrude(amount=MOVE_FACE_6_M3_3_3_2_DEPTH)

    # v3_06__B__105 outline → v3_06__B__105 (add)
    # profile 1 of 3: a face of its own
    with BuildSketch(Plane(origin=(0, 0, 0), x_dir=(1, 0, 0), z_dir=(0, 1, 0)).offset(V3_06_B_105_START)):
        with Locations((0, 49.5)):
            Rectangle(V3_06_B_105_OUTLINE_W, V3_06_B_105_OUTLINE_H)
        with Locations((-101, 97)):
            Circle(V3_06_B_105_OUTLINE_R, mode=Mode.SUBTRACT)
        with Locations((101, 97)):
            Circle(V3_06_B_105_OUTLINE_R, mode=Mode.SUBTRACT)
    # profile 2 of 3: a face of its own
    with BuildSketch(Plane(origin=(0, 0, 0), x_dir=(1, 0, 0), z_dir=(0, 1, 0)).offset(V3_06_B_105_START)):
        with Locations((101, -8)):
            Circle(V3_06_B_105_OUTLINE_R)
    # profile 3 of 3: a face of its own
    with BuildSketch(Plane(origin=(0, 0, 0), x_dir=(1, 0, 0), z_dir=(0, 1, 0)).offset(V3_06_B_105_START)):
        with Locations((-101, -8)):
            Circle(V3_06_B_105_OUTLINE_R)
    extrude(amount=V3_06_B_105_DEPTH)

    # v3_05__A__105 outline → v3_05__A__105 (add)
    # profile 1 of 3: a face of its own
    with BuildSketch(Plane(origin=(0, 0, 0), x_dir=(1, 0, 0), z_dir=(0, 1, 0)).offset(V3_05_A_105_START)):
        with BuildLine():
            Line((-43, -3), (120, -3))
            Line((120, -3), (120, 102))
            Line((120, 102), (-43, 102))
            Line((-43, 102), (-43, 95))
            ThreePointArc((-43, 95), (-43.878679656, 92.878679656), (-46, 92))
            Line((-46, 92), (-80, 92))
            ThreePointArc((-80, 92), (-82.121320344, 92.878679656), (-83, 95))
            Line((-83, 95), (-83, 102))
            Line((-83, 102), (-120, 102))
            Line((-120, 102), (-120, -3))
            Line((-120, -3), (-83, -3))
            Line((-83, -3), (-83, -10))
            ThreePointArc((-83, -10), (-82.121320344, -12.121320344), (-80, -13))
            Line((-80, -13), (-46, -13))
            ThreePointArc((-46, -13), (-43.878679656, -12.121320344), (-43, -10))
            Line((-43, -10), (-43, -3))
        make_face()
        with Locations((-101, 97)):
            Circle(V3_05_A_105_OUTLINE_R, mode=Mode.SUBTRACT)
        with Locations((101, 97)):
            Circle(V3_05_A_105_OUTLINE_R, mode=Mode.SUBTRACT)
    # profile 2 of 3: a face of its own
    with BuildSketch(Plane(origin=(0, 0, 0), x_dir=(1, 0, 0), z_dir=(0, 1, 0)).offset(V3_05_A_105_START)):
        with Locations((101, -8)):
            Circle(V3_05_A_105_OUTLINE_R)
    # profile 3 of 3: a face of its own
    with BuildSketch(Plane(origin=(0, 0, 0), x_dir=(1, 0, 0), z_dir=(0, 1, 0)).offset(V3_05_A_105_START)):
        with Locations((-101, -8)):
            Circle(V3_05_A_105_OUTLINE_R)
    extrude(amount=V3_05_A_105_DEPTH)

    # v3__77x53 2 → v3__77x53 (cut)
    with BuildSketch(Plane(origin=(0, 85, 0), x_dir=(1, 0, 0), z_dir=(0, 1, 0))):
        with Locations((69, 58.5)):
            Rectangle(V3_77X53_2_W, V3_77X53_2_H)
    extrude(amount=-V3_77X53_DEPTH, mode=Mode.SUBTRACT)


with BuildPart() as body_6_2_1:
    add(body_6_2.part)

    # Cut-Extrude 6: cut by cut_extrude_6_tool
    add(cut_extrude_6_tool.part, mode=Mode.SUBTRACT)

    # Sketch 22 → Cut-Extrude 7 (cut, through all)
    with BuildSketch(Plane.XZ.offset(82)):
        with Locations((-101, 108)):
            Circle(SKETCH_22_R)
        with Locations(Location((101, 108, 0), (0, 0, 270))):
            Circle(SKETCH_22_R)
    extrude(amount=-CUT_EXTRUDE_7_DEPTH, mode=Mode.SUBTRACT)

    # Fillet 2
    fillet_2_edges = [body_6_2_1.edges().sort_by_distance(p)[0] for p in [
        (-112, -15, 114.5),
        (-112, 15, 114.5),
        (31, -75, 114.5),
        (31, 75, 114.5),
        (11, 75, 114.5),
        (11, -75, 114.5),
    ]]
    fillet(fillet_2_edges, radius=FILLET_2_R)


with BuildPart() as a_m4_tool:
    # A___M4 2 → A___M4 (new body)
    with BuildSketch(Plane.ZY.offset(-111)):
        with Locations(Location((108, -66, 0), (0, 0, 270))):
            Circle(A_M4_2_R)
        with Locations(Location((108, 66, 0), (0, 0, 270))):
            Circle(A_M4_2_R)
    extrude(amount=-A_M4_DEPTH)


with BuildPart() as body_3_2:
    add(body_3_1.part)

    # A___M4: cut by a_m4_tool
    add(a_m4_tool.part, mode=Mode.SUBTRACT)

    # Move Face M4__4.2_4.5: a curved face moved inward by 0.15
    add(Solid.thicken(body_3_2.faces().sort_by_distance((118.5, -68.1, 8))[0], -MOVE_FACE_M4_4_2_4_5_BY), mode=Mode.SUBTRACT)

    # Move Face M4__4.2_4.5 2: a curved face moved inward by 0.15
    add(Solid.thicken(body_3_2.faces().sort_by_distance((118.5, 63.9, 8))[0], -MOVE_FACE_M4_4_2_4_5_2_BY), mode=Mode.SUBTRACT)

    # v3_03__A__105 outline → v3_03__A__105 (add)
    # profile 1 of 3: a face of its own
    with BuildSketch(Plane.YZ.offset(V3_03_A_105_START)):
        with Locations((0, -49.5)):
            Rectangle(V3_03_A_105_OUTLINE_W, V3_03_A_105_OUTLINE_H)
        with Locations((-66, -97)):
            Circle(V3_03_A_105_OUTLINE_R, mode=Mode.SUBTRACT)
        with Locations((66, -97)):
            Circle(V3_03_A_105_OUTLINE_R, mode=Mode.SUBTRACT)
    # profile 2 of 3: a face of its own
    with BuildSketch(Plane.YZ.offset(V3_03_A_105_START)):
        with Locations((-66, 8)):
            Circle(V3_03_A_105_OUTLINE_R)
    # profile 3 of 3: a face of its own
    with BuildSketch(Plane.YZ.offset(V3_03_A_105_START)):
        with Locations((66, 8)):
            Circle(V3_03_A_105_OUTLINE_R)
    extrude(amount=V3_03_A_105_DEPTH)

    # Sketch 26 → Cut-Extrude 8 (cut, through all)
    with BuildSketch(Plane(origin=(120, 0, 0), x_dir=(0, 0, -1), z_dir=(1, 0, 0))):
        with BuildLine():
            Line((34.453025431, 69.349860583), (68.485469648, 69.349860583))
            ThreePointArc((68.485469648, 69.349860583), (70.606789992, 68.471180927), (71.485469648, 66.349860583))
            Line((71.485469648, 66.349860583), (71.485469648, -68.687519812))
            ThreePointArc((71.485469648, -68.687519812), (70.606789992, -70.808840156), (68.485469648, -71.687519812))
            Line((68.485469648, -71.687519812), (34.453025431, -71.687519812))
            ThreePointArc((34.453025431, -71.687519812), (32.331705088, -70.808840156), (31.453025431, -68.687519812))
            Line((31.453025431, -68.687519812), (31.453025431, 66.349860583))
            ThreePointArc((31.453025431, 66.349860583), (32.331705088, 68.471180927), (34.453025431, 69.349860583))
        make_face()
    extrude(amount=-CUT_EXTRUDE_8_DEPTH, mode=Mode.SUBTRACT)


with BuildPart() as body_6_2_2:
    add(body_6_2_1.part)

    # A___M4: cut by a_m4_tool
    add(a_m4_tool.part, mode=Mode.SUBTRACT)


with BuildPart() as b_m4_tool:
    # B___M4 2 → B___M4 (new body)
    with BuildSketch(Plane(origin=(-111, 0, 0), x_dir=(0, 0, -1), z_dir=(1, 0, 0))):
        with Locations(Location((-108, -66, 0), (0, 0, 270))):
            Circle(B_M4_2_R)
        with Locations(Location((-108, 66, 0), (0, 0, 270))):
            Circle(B_M4_2_R)
    extrude(amount=-B_M4_DEPTH)


with BuildPart() as body_4_2:
    add(body_4_1.part)

    # B___M4: cut by b_m4_tool
    add(b_m4_tool.part, mode=Mode.SUBTRACT)

    # Move Face M4__4.2_4.5 7: a curved face moved inward by 0.15
    add(Solid.thicken(body_4_2.faces().sort_by_distance((-118.5, -68.1, 8))[0], -MOVE_FACE_M4_4_2_4_5_7_BY), mode=Mode.SUBTRACT)

    # Move Face M4__4.2_4.5 8: a curved face moved inward by 0.15
    add(Solid.thicken(body_4_2.faces().sort_by_distance((-118.5, 63.9, 8))[0], -MOVE_FACE_M4_4_2_4_5_8_BY), mode=Mode.SUBTRACT)

    # v3_04__B__105 outline → v3_04__B__105 (add)
    # profile 1 of 3: a face of its own
    with BuildSketch(Plane.YZ.offset(V3_04_B_105_START)):
        with Locations((0, -49.5)):
            Rectangle(V3_04_B_105_OUTLINE_W, V3_04_B_105_OUTLINE_H)
        with Locations((-66, -97)):
            Circle(V3_04_B_105_OUTLINE_R, mode=Mode.SUBTRACT)
        with Locations((66, -97)):
            Circle(V3_04_B_105_OUTLINE_R, mode=Mode.SUBTRACT)
    # profile 2 of 3: a face of its own
    with BuildSketch(Plane.YZ.offset(V3_04_B_105_START)):
        with Locations((-66, 8)):
            Circle(V3_04_B_105_OUTLINE_R)
    # profile 3 of 3: a face of its own
    with BuildSketch(Plane.YZ.offset(V3_04_B_105_START)):
        with Locations((66, 8)):
            Circle(V3_04_B_105_OUTLINE_R)
    extrude(amount=V3_04_B_105_DEPTH)


with BuildPart() as body_6_2_3:
    add(body_6_2_2.part)

    # B___M4: cut by b_m4_tool
    add(b_m4_tool.part, mode=Mode.SUBTRACT)

    # Move Face 6_M3_3.3 3 outline → Move Face 6_M3_3.3 3 (add)
    # profile 1 of 2: a face of its own
    with BuildSketch(Plane(origin=(0, 0, 0), x_dir=(1, 0, 0), z_dir=(0, 1, 0)).offset(MOVE_START_4)):
        with Locations((101, -108)):
            Circle(MOVE_FACE_6_M3_3_3_3_OUTLINE_R)
        with Locations((101, -108)):
            Circle(MOVE_FACE_6_M3_3_3_3_OUTLINE_R_2, mode=Mode.SUBTRACT)
    # profile 2 of 2: a face of its own
    with BuildSketch(Plane(origin=(0, 0, 0), x_dir=(1, 0, 0), z_dir=(0, 1, 0)).offset(MOVE_START_4)):
        with Locations((-101, -108)):
            Circle(MOVE_FACE_6_M3_3_3_3_OUTLINE_R)
        with Locations((-101, -108)):
            Circle(MOVE_FACE_6_M3_3_3_3_OUTLINE_R_2, mode=Mode.SUBTRACT)
    extrude(amount=MOVE_FACE_6_M3_3_3_3_DEPTH)

    # Move Face 6_M3_3.3 4 outline → Move Face 6_M3_3.3 4 (add)
    # profile 1 of 2: a face of its own
    with BuildSketch(Plane(origin=(0, 0, 0), x_dir=(1, 0, 0), z_dir=(0, 1, 0)).offset(MOVE_START_5)):
        with Locations((101, -108)):
            Circle(MOVE_FACE_6_M3_3_3_4_OUTLINE_R)
        with Locations((101, -108)):
            Circle(MOVE_FACE_6_M3_3_3_4_OUTLINE_R_2, mode=Mode.SUBTRACT)
    # profile 2 of 2: a face of its own
    with BuildSketch(Plane(origin=(0, 0, 0), x_dir=(1, 0, 0), z_dir=(0, 1, 0)).offset(MOVE_START_5)):
        with Locations((-101, -108)):
            Circle(MOVE_FACE_6_M3_3_3_4_OUTLINE_R)
        with Locations((-101, -108)):
            Circle(MOVE_FACE_6_M3_3_3_4_OUTLINE_R_2, mode=Mode.SUBTRACT)
    extrude(amount=MOVE_FACE_6_M3_3_3_4_DEPTH)

    # Y__M3___5.9_1.5 2 → Y__M3___5.9_1.5 (cut)
    with BuildSketch(Plane.XZ.offset(-76)):
        Polygon((-97.593633412, 108), (-99.296816706, 110.95), (-102.703183294, 110.95), (-104.406366588, 108), (-102.703183294, 105.05), (-99.296816706, 105.05), align=None)
        Polygon((104.406366588, 108), (102.703183294, 110.95), (99.296816706, 110.95), (97.593633412, 108), (99.296816706, 105.05), (102.703183294, 105.05), align=None)
    extrude(amount=-Y_M3_5_9_1_5_DEPTH, mode=Mode.SUBTRACT)

    # Y__M3___5.9_1.5 4 → Y__M3___5.9_1.5 3 (cut)
    with BuildSketch(Plane(origin=(0, -76, 0), x_dir=(1, 0, 0), z_dir=(0, 1, 0))):
        Polygon((-97.593633412, -108), (-99.296816706, -110.95), (-102.703183294, -110.95), (-104.406366588, -108), (-102.703183294, -105.05), (-99.296816706, -105.05), align=None)
        Polygon((104.406366588, -108), (102.703183294, -110.95), (99.296816706, -110.95), (97.593633412, -108), (99.296816706, -105.05), (102.703183294, -105.05), align=None)
    extrude(amount=-Y_M3_5_9_1_5_3_DEPTH, mode=Mode.SUBTRACT)


with BuildPart() as part_1:
    # Move Body v3__105: moved
    add(part.part.moved(Location((0, 0, -105))))


solid = body_3_2.part
